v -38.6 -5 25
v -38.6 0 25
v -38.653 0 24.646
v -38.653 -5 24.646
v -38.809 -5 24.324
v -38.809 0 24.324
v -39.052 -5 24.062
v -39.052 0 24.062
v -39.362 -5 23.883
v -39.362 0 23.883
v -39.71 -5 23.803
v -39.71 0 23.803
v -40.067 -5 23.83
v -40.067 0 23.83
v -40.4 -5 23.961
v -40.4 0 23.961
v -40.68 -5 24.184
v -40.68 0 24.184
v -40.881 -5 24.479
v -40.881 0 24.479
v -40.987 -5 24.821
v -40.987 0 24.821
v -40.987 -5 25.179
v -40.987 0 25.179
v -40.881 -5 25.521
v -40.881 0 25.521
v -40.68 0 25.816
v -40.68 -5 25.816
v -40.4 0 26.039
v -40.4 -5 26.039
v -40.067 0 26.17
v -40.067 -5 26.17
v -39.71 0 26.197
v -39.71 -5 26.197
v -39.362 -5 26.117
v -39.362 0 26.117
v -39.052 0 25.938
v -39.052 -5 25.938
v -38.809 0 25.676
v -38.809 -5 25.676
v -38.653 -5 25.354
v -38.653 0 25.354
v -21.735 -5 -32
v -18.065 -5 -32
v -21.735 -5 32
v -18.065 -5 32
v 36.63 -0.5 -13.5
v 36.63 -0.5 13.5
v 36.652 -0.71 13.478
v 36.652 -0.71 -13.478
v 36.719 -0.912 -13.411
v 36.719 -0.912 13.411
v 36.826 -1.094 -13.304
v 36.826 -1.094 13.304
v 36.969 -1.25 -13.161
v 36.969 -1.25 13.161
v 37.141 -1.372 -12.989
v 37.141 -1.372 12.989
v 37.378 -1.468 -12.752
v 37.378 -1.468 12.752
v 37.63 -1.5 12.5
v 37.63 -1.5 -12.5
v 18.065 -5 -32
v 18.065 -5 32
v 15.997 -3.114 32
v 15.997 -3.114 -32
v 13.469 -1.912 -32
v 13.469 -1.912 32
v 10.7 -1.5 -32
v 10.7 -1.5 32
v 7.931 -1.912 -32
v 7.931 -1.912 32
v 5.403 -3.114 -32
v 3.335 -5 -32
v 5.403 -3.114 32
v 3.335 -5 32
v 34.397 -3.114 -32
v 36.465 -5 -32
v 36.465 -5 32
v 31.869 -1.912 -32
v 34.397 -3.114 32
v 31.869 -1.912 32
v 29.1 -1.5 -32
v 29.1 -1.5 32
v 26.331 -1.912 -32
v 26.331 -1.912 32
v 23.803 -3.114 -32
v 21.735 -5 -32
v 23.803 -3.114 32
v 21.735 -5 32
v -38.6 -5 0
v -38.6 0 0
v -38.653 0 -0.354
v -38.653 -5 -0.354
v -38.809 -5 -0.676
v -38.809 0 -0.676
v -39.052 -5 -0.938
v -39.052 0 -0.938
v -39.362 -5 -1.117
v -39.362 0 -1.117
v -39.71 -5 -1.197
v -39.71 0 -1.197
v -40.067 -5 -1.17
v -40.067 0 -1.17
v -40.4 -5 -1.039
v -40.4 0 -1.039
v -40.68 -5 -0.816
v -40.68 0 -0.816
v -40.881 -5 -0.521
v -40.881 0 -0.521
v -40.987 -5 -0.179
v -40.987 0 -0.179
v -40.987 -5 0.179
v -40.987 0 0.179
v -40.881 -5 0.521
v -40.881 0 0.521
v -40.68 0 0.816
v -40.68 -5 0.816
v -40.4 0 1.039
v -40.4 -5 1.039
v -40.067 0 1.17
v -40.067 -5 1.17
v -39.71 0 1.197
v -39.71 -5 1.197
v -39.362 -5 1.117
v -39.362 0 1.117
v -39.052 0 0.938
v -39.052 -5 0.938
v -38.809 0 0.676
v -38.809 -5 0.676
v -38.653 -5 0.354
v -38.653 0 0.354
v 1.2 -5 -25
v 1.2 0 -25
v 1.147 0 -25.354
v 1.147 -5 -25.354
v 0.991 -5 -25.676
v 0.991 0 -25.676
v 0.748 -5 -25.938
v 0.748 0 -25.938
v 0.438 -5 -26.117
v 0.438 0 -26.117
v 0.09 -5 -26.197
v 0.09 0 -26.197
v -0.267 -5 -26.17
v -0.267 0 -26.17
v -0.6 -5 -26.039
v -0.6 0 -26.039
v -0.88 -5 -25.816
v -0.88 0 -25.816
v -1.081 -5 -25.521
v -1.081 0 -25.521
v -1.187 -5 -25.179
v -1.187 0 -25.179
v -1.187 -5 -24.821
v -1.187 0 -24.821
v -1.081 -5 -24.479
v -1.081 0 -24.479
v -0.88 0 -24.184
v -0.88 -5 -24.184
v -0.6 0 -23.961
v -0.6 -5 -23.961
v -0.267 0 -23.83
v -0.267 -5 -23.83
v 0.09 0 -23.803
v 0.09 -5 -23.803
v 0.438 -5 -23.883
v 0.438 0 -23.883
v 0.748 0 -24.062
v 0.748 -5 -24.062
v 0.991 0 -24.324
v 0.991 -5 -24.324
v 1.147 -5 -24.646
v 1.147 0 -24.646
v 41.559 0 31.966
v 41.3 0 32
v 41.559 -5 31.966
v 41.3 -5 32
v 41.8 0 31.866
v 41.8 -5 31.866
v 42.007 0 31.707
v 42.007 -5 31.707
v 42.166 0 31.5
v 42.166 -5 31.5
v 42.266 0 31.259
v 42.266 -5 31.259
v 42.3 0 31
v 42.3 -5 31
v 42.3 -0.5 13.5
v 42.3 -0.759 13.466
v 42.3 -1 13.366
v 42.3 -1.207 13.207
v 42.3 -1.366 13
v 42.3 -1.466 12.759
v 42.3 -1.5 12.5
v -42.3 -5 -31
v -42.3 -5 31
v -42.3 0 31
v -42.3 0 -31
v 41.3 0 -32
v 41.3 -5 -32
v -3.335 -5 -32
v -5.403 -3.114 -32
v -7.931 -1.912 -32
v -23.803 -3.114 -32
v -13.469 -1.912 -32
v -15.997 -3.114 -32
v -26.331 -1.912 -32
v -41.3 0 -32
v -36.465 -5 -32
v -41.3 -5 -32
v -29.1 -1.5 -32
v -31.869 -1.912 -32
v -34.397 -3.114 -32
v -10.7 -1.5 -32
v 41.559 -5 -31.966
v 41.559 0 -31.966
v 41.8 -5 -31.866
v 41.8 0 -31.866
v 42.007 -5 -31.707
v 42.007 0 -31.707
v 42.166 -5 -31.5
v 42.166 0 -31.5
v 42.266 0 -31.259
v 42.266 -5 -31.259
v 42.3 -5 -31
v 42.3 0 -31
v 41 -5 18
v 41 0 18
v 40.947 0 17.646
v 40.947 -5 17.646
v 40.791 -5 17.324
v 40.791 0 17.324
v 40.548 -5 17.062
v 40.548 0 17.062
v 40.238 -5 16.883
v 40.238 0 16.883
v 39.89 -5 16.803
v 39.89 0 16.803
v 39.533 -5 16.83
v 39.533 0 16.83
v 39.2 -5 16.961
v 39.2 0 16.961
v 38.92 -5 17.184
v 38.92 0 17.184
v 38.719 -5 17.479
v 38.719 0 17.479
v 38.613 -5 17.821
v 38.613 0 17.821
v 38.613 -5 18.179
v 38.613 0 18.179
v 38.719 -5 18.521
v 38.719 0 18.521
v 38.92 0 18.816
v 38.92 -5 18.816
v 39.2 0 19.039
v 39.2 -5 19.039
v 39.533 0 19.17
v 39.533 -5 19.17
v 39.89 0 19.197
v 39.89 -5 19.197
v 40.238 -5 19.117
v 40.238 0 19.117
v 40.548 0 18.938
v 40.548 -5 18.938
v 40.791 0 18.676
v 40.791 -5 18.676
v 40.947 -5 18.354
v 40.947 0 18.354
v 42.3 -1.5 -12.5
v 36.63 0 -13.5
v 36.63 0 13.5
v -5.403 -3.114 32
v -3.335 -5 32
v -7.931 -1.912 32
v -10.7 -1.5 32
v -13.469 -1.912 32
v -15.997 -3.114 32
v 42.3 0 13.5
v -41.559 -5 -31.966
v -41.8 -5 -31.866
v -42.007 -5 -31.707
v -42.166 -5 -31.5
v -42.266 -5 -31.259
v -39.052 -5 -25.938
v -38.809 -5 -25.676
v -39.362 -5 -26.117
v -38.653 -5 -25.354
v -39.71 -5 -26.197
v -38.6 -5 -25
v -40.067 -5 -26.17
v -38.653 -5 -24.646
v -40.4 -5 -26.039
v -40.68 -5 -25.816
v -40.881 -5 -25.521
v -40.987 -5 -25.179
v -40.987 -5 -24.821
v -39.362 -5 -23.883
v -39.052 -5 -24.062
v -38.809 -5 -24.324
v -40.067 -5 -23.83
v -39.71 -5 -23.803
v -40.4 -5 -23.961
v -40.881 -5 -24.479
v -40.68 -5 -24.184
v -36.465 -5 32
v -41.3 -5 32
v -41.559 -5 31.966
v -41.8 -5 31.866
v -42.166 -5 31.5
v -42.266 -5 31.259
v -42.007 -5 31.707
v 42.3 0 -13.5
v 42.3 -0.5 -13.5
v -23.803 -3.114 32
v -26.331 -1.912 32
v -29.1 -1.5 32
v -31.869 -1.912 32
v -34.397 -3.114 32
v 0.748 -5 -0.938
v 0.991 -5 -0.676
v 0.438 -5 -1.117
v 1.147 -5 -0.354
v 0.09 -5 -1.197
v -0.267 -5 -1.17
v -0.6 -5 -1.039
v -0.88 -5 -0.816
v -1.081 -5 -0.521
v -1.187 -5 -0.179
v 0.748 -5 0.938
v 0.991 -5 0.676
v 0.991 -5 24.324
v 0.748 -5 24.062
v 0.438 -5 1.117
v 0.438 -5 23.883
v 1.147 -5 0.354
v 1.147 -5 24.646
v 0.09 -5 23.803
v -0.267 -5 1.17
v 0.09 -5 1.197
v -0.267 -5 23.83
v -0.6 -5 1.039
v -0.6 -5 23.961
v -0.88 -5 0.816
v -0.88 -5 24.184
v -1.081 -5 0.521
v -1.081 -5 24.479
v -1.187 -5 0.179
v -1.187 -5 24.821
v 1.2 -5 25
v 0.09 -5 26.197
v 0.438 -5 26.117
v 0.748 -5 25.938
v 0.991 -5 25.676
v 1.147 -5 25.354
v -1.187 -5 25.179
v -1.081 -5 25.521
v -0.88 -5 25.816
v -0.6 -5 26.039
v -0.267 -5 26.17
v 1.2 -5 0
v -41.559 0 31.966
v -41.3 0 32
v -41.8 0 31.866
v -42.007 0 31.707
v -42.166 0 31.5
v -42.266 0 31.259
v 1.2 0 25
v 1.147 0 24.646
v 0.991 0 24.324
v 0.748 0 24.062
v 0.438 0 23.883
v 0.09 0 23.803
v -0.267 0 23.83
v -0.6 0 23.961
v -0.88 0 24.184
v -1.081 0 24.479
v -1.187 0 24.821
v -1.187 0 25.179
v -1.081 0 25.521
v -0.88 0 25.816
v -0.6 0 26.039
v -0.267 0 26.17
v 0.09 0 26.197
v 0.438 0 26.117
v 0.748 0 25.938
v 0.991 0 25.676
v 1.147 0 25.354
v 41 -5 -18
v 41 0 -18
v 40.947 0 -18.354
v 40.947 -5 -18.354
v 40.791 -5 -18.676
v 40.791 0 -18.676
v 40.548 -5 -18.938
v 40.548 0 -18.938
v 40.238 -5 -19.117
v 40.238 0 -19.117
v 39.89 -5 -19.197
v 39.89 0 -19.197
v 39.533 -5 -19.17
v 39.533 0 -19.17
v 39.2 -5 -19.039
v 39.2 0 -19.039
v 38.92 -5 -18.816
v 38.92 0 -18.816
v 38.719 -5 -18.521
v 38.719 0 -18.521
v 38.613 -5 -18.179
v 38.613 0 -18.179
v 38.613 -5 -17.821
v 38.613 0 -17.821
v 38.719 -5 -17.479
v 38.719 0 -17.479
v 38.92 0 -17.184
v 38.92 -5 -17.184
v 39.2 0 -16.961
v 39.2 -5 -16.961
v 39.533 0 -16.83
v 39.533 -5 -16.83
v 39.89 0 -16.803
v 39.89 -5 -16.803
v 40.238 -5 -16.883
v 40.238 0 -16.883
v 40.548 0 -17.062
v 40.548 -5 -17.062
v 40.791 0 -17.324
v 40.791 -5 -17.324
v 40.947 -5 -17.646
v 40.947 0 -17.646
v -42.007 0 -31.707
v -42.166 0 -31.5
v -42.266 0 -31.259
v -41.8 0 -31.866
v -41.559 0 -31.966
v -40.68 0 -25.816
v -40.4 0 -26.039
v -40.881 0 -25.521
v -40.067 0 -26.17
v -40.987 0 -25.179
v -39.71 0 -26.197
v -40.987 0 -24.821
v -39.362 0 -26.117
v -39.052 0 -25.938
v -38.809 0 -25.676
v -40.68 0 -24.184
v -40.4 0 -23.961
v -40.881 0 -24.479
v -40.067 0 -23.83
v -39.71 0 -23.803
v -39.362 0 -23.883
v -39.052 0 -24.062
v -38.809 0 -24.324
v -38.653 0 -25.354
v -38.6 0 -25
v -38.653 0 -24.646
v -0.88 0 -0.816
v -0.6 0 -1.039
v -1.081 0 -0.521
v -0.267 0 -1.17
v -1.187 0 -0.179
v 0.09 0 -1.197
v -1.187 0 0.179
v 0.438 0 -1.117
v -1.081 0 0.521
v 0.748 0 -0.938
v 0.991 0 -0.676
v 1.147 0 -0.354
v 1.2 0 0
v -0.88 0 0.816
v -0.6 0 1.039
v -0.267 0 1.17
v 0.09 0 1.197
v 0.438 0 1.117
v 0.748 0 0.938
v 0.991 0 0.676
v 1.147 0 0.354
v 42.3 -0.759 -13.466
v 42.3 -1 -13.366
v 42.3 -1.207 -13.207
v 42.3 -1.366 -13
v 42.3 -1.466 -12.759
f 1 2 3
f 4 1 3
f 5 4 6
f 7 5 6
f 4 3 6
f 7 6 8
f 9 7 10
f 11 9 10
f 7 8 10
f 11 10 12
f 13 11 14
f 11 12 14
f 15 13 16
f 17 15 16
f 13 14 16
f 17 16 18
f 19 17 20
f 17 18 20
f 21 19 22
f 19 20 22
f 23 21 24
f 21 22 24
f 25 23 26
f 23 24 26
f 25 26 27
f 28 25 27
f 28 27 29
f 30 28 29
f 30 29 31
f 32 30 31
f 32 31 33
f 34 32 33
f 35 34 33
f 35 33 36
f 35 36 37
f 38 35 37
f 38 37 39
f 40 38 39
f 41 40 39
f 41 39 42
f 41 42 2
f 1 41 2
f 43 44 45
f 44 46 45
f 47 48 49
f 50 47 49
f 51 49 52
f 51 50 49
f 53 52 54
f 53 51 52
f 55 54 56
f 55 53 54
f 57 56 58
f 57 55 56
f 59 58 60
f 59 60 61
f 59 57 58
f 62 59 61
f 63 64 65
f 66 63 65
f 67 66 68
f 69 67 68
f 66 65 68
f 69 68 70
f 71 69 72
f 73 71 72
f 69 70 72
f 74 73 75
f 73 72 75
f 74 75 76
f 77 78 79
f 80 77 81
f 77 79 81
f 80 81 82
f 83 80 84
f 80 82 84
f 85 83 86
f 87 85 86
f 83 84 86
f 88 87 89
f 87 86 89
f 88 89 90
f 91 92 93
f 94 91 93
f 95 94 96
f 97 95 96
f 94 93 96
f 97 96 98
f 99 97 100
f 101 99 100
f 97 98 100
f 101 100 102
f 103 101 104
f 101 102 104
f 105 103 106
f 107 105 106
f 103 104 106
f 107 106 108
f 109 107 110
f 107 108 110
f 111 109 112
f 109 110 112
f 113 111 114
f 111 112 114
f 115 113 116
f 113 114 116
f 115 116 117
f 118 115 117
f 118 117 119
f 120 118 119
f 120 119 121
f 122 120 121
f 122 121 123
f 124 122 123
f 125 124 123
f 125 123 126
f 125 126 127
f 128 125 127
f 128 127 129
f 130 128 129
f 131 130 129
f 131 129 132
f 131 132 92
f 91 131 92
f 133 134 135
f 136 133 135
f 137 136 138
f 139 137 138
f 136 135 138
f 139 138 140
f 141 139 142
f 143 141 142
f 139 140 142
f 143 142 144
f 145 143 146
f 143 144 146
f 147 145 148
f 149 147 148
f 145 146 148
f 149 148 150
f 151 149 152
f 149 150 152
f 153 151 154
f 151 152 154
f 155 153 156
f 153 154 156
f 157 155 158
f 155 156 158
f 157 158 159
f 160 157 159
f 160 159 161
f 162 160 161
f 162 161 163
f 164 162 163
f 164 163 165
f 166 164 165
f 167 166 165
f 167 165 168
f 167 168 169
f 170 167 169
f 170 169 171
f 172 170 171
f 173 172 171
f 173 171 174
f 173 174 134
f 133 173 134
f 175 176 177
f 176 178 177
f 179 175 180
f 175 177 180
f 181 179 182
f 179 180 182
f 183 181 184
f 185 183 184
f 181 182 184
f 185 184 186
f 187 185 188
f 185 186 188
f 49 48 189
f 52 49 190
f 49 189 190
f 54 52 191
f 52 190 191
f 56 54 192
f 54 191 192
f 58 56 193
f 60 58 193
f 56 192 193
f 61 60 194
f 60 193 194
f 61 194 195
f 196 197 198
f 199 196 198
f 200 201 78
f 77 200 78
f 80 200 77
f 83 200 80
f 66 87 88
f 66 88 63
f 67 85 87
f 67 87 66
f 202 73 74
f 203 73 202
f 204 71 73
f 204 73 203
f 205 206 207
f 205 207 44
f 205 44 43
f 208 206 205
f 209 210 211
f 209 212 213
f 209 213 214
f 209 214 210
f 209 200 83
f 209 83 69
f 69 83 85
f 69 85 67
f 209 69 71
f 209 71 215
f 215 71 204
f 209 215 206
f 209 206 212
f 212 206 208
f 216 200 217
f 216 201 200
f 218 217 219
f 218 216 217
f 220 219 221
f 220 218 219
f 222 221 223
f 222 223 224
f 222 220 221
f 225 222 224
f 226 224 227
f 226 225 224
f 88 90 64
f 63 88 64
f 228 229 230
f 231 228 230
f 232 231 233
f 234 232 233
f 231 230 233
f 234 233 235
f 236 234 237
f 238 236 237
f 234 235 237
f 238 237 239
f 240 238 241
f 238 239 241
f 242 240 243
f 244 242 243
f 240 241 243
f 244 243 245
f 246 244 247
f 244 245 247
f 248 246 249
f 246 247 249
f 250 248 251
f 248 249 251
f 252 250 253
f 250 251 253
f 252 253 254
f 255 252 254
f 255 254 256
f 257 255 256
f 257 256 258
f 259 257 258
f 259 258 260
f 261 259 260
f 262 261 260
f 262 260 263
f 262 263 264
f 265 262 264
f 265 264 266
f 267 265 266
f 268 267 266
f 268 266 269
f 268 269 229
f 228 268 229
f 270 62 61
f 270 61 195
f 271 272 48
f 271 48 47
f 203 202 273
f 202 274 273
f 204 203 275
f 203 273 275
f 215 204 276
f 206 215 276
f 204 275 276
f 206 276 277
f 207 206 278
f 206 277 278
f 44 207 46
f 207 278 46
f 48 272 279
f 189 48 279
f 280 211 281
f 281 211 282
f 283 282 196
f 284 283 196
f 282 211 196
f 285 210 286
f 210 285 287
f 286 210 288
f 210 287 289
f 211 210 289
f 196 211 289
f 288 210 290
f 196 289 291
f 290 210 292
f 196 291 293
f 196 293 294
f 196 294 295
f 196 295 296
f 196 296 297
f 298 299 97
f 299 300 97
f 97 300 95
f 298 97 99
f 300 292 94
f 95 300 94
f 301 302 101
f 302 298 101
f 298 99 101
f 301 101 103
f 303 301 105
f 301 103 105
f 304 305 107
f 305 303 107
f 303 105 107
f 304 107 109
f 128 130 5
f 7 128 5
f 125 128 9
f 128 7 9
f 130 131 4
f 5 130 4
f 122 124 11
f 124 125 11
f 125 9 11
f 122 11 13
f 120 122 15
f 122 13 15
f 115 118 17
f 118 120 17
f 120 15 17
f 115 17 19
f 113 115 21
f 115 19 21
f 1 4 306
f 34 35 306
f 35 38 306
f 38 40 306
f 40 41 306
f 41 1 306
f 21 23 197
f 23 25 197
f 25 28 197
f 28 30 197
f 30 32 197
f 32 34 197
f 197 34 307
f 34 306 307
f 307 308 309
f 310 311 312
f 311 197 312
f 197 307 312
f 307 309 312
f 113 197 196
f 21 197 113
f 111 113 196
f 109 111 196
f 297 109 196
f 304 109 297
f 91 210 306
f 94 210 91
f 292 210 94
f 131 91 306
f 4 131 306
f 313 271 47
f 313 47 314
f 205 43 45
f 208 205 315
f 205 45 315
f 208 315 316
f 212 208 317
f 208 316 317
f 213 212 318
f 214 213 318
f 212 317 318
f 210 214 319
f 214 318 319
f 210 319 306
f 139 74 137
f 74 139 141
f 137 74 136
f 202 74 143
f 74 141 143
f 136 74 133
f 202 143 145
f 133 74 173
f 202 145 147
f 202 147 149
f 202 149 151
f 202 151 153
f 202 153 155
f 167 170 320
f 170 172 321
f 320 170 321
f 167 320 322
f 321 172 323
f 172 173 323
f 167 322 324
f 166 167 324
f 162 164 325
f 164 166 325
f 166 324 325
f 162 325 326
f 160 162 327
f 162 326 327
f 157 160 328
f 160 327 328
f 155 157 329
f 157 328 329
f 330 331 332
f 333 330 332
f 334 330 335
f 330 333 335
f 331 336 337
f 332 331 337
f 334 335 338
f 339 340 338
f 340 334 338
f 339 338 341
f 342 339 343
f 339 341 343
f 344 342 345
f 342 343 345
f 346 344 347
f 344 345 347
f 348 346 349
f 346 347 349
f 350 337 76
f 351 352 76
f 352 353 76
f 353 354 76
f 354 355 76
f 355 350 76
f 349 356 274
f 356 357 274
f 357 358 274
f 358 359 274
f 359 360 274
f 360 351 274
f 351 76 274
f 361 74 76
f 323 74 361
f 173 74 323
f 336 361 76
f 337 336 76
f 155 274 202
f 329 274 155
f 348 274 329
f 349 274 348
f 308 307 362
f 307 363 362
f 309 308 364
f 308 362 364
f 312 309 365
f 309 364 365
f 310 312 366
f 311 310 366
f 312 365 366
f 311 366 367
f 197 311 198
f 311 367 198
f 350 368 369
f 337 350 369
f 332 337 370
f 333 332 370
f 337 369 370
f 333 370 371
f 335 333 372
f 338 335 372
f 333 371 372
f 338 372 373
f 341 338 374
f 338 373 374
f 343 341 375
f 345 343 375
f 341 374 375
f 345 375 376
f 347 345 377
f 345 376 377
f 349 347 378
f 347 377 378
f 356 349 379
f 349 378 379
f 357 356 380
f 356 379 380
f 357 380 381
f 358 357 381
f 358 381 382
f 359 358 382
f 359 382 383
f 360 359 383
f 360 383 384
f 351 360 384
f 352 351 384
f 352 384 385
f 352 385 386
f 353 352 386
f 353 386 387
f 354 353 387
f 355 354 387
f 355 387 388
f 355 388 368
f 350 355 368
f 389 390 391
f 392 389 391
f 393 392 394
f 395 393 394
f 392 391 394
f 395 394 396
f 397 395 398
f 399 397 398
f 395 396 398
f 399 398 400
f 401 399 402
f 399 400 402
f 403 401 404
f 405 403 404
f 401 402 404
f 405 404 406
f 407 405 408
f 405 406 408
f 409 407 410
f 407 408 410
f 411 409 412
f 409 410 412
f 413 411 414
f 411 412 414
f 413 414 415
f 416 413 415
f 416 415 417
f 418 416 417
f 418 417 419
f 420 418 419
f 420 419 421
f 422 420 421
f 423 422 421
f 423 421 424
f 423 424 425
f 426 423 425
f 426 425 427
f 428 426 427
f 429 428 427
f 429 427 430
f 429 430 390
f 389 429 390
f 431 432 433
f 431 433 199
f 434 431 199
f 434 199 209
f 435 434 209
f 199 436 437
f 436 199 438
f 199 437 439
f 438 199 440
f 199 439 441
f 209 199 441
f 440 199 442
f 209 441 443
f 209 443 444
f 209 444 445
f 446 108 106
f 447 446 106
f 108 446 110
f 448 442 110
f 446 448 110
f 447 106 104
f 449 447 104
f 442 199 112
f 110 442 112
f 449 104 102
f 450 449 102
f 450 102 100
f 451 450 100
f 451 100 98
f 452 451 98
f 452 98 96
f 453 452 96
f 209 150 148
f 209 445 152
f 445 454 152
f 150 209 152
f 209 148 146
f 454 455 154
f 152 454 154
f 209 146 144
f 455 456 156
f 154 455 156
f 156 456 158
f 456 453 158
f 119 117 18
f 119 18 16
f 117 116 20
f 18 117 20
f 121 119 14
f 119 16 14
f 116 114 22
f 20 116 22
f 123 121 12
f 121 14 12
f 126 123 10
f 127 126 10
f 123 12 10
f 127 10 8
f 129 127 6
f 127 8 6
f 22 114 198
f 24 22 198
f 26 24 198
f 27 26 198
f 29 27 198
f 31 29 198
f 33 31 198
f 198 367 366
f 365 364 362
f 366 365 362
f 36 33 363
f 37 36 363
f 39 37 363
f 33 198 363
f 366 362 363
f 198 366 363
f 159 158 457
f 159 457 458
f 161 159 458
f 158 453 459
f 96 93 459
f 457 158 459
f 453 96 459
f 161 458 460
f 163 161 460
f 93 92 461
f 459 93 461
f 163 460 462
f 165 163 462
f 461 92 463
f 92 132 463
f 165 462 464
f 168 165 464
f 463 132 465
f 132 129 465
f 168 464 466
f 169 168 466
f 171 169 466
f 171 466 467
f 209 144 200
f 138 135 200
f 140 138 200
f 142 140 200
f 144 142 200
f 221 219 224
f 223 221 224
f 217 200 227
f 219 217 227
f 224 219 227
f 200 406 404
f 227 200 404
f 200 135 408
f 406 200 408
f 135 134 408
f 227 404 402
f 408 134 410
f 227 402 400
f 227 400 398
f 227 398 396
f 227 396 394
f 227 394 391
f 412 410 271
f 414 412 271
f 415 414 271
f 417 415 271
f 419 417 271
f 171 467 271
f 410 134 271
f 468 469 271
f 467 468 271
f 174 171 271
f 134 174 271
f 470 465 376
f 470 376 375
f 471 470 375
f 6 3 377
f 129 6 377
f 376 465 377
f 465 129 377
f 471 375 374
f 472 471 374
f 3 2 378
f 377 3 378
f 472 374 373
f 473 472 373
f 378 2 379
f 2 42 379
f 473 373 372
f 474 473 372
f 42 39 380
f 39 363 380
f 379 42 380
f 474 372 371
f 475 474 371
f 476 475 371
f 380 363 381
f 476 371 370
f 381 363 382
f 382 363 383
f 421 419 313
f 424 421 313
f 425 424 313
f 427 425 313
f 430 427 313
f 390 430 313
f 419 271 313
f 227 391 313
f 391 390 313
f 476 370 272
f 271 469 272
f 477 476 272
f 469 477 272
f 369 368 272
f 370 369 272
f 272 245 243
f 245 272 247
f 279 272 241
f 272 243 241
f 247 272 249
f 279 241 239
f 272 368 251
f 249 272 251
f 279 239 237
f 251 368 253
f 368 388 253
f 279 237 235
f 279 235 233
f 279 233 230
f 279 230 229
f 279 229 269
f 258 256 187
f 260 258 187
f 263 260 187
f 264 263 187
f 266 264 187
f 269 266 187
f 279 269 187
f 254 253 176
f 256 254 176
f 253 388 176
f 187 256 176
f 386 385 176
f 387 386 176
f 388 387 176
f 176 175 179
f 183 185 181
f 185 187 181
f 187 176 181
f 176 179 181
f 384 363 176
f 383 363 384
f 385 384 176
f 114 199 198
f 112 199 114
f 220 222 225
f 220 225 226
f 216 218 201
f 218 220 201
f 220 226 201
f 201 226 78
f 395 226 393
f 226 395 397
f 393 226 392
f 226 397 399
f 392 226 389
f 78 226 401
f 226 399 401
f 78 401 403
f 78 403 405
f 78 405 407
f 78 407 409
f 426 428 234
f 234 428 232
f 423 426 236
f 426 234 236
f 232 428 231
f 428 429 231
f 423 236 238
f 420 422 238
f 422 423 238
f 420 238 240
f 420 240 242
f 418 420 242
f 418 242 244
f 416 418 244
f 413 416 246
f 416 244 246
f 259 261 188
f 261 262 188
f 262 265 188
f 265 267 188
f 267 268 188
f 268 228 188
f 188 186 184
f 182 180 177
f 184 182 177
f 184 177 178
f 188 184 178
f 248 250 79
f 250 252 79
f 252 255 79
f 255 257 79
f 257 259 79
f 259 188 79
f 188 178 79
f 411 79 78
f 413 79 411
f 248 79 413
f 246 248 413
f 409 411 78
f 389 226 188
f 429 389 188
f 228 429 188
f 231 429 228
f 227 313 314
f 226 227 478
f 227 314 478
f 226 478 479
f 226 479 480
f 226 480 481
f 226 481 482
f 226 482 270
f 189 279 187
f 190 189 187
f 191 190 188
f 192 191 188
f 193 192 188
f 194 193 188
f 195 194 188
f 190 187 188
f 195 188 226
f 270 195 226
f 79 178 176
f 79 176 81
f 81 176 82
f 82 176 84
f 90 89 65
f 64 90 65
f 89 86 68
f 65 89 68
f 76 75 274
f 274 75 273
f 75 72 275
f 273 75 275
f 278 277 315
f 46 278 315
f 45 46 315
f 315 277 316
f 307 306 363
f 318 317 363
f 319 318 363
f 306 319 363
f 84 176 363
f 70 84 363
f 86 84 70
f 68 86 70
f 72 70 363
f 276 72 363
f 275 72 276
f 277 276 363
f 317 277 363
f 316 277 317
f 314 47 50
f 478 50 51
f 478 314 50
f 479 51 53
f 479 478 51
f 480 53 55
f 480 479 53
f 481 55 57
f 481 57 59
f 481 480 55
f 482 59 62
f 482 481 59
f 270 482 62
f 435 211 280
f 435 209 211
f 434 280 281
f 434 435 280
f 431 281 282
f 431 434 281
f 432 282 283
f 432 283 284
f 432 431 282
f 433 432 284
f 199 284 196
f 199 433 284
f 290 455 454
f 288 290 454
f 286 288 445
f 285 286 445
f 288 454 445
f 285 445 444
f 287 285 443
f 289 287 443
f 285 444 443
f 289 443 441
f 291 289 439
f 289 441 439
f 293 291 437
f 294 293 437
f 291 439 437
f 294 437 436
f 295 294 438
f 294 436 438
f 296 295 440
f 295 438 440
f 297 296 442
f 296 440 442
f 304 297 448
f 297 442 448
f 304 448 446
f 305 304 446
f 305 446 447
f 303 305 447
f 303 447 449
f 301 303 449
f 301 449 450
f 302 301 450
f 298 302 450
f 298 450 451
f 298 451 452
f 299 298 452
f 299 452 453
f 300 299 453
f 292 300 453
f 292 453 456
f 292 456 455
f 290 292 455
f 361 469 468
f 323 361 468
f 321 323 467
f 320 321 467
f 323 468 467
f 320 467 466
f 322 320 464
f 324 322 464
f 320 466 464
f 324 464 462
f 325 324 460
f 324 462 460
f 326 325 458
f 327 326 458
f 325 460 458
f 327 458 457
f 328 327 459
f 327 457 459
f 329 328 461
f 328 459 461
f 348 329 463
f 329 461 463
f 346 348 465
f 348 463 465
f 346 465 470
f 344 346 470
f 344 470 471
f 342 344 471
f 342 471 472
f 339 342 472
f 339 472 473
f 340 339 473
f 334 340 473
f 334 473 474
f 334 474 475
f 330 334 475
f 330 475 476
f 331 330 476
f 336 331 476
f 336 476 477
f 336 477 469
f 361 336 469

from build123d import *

# Parameters (mm, degrees)
BOSS_EXTRUDE1_DEPTH  = 32
M2_CLEARANCE_HOLE1_D = 2.4
FILLET1_R            = 1
SKETCH9_W            = 5.67
SKETCH9_H            = 27
CUT_EXTRUDE1_DEPTH   = 1.5
FILLET2_R            = 1


with BuildPart() as part:
    # Sketch2 → Boss-Extrude1 (new, symmetric)
    with BuildSketch(Plane.XY):
        with BuildLine():
            Line((3.334540069, -5), (-3.334540069, -5))
            ThreePointArc((-3.334540069, -5), (-10.7, -1.5), (-18.065459931, -5))
            Line((-18.065459931, -5), (-21.734540069, -5))
            ThreePointArc((-21.734540069, -5), (-29.1, -1.5), (-36.465459931, -5))
            Line((-36.465459931, -5), (-42.3, -5))
            Line((-42.3, -5), (-42.3, 0))
            Line((-42.3, 0), (42.3, 0))
            Line((42.3, 0), (42.3, -5))
            Line((42.3, -5), (36.465459931, -5))
            ThreePointArc((36.465459931, -5), (29.1, -1.5), (21.734540069, -5))
            Line((21.734540069, -5), (18.065459931, -5))
            ThreePointArc((18.065459931, -5), (10.7, -1.5), (3.334540069, -5))
        make_face()
    extrude(amount=BOSS_EXTRUDE1_DEPTH, both=True)

    # M2 Clearance Hole1 (through all)
    with Locations(Plane(origin=(0, -5, 0), x_dir=(-1, 0, 0), z_dir=(0, -1, 0))):
        with Locations((0, 25), (0, 0), (0, -25), (39.8, -25), (39.8, 0), (39.8, 25), (-39.8, -18), (-39.8, 18)):
            Hole(M2_CLEARANCE_HOLE1_D / 2)

    # Fillet1
    fillet1_edges = [part.edges().sort_by_distance(p)[0] for p in [
        (42.3, -2.5, -32),
        (-42.3, -2.5, -32),
        (-42.3, -2.5, 32),
        (42.3, -2.5, 32),
    ]]
    fillet(fillet1_edges, radius=FILLET1_R)

    # Sketch9 → Cut-Extrude1 (cut)
    with BuildSketch(Plane(origin=(0, 0, 0), x_dir=(1, 0, 0), z_dir=(0, 1, 0))):
        with Locations((39.465, 0)):
            Rectangle(SKETCH9_W, SKETCH9_H)
    extrude(amount=-CUT_EXTRUDE1_DEPTH, mode=Mode.SUBTRACT)

    # Fillet2
    fillet2_edges = [part.edges().sort_by_distance(p)[0] for p in [
        (39.465, -1.5, 13.5),
        (36.63, -1.5, 0),
        (39.465, -1.5, -13.5),
    ]]
    fillet(fillet2_edges, radius=FILLET2_R)


solid = part.part
